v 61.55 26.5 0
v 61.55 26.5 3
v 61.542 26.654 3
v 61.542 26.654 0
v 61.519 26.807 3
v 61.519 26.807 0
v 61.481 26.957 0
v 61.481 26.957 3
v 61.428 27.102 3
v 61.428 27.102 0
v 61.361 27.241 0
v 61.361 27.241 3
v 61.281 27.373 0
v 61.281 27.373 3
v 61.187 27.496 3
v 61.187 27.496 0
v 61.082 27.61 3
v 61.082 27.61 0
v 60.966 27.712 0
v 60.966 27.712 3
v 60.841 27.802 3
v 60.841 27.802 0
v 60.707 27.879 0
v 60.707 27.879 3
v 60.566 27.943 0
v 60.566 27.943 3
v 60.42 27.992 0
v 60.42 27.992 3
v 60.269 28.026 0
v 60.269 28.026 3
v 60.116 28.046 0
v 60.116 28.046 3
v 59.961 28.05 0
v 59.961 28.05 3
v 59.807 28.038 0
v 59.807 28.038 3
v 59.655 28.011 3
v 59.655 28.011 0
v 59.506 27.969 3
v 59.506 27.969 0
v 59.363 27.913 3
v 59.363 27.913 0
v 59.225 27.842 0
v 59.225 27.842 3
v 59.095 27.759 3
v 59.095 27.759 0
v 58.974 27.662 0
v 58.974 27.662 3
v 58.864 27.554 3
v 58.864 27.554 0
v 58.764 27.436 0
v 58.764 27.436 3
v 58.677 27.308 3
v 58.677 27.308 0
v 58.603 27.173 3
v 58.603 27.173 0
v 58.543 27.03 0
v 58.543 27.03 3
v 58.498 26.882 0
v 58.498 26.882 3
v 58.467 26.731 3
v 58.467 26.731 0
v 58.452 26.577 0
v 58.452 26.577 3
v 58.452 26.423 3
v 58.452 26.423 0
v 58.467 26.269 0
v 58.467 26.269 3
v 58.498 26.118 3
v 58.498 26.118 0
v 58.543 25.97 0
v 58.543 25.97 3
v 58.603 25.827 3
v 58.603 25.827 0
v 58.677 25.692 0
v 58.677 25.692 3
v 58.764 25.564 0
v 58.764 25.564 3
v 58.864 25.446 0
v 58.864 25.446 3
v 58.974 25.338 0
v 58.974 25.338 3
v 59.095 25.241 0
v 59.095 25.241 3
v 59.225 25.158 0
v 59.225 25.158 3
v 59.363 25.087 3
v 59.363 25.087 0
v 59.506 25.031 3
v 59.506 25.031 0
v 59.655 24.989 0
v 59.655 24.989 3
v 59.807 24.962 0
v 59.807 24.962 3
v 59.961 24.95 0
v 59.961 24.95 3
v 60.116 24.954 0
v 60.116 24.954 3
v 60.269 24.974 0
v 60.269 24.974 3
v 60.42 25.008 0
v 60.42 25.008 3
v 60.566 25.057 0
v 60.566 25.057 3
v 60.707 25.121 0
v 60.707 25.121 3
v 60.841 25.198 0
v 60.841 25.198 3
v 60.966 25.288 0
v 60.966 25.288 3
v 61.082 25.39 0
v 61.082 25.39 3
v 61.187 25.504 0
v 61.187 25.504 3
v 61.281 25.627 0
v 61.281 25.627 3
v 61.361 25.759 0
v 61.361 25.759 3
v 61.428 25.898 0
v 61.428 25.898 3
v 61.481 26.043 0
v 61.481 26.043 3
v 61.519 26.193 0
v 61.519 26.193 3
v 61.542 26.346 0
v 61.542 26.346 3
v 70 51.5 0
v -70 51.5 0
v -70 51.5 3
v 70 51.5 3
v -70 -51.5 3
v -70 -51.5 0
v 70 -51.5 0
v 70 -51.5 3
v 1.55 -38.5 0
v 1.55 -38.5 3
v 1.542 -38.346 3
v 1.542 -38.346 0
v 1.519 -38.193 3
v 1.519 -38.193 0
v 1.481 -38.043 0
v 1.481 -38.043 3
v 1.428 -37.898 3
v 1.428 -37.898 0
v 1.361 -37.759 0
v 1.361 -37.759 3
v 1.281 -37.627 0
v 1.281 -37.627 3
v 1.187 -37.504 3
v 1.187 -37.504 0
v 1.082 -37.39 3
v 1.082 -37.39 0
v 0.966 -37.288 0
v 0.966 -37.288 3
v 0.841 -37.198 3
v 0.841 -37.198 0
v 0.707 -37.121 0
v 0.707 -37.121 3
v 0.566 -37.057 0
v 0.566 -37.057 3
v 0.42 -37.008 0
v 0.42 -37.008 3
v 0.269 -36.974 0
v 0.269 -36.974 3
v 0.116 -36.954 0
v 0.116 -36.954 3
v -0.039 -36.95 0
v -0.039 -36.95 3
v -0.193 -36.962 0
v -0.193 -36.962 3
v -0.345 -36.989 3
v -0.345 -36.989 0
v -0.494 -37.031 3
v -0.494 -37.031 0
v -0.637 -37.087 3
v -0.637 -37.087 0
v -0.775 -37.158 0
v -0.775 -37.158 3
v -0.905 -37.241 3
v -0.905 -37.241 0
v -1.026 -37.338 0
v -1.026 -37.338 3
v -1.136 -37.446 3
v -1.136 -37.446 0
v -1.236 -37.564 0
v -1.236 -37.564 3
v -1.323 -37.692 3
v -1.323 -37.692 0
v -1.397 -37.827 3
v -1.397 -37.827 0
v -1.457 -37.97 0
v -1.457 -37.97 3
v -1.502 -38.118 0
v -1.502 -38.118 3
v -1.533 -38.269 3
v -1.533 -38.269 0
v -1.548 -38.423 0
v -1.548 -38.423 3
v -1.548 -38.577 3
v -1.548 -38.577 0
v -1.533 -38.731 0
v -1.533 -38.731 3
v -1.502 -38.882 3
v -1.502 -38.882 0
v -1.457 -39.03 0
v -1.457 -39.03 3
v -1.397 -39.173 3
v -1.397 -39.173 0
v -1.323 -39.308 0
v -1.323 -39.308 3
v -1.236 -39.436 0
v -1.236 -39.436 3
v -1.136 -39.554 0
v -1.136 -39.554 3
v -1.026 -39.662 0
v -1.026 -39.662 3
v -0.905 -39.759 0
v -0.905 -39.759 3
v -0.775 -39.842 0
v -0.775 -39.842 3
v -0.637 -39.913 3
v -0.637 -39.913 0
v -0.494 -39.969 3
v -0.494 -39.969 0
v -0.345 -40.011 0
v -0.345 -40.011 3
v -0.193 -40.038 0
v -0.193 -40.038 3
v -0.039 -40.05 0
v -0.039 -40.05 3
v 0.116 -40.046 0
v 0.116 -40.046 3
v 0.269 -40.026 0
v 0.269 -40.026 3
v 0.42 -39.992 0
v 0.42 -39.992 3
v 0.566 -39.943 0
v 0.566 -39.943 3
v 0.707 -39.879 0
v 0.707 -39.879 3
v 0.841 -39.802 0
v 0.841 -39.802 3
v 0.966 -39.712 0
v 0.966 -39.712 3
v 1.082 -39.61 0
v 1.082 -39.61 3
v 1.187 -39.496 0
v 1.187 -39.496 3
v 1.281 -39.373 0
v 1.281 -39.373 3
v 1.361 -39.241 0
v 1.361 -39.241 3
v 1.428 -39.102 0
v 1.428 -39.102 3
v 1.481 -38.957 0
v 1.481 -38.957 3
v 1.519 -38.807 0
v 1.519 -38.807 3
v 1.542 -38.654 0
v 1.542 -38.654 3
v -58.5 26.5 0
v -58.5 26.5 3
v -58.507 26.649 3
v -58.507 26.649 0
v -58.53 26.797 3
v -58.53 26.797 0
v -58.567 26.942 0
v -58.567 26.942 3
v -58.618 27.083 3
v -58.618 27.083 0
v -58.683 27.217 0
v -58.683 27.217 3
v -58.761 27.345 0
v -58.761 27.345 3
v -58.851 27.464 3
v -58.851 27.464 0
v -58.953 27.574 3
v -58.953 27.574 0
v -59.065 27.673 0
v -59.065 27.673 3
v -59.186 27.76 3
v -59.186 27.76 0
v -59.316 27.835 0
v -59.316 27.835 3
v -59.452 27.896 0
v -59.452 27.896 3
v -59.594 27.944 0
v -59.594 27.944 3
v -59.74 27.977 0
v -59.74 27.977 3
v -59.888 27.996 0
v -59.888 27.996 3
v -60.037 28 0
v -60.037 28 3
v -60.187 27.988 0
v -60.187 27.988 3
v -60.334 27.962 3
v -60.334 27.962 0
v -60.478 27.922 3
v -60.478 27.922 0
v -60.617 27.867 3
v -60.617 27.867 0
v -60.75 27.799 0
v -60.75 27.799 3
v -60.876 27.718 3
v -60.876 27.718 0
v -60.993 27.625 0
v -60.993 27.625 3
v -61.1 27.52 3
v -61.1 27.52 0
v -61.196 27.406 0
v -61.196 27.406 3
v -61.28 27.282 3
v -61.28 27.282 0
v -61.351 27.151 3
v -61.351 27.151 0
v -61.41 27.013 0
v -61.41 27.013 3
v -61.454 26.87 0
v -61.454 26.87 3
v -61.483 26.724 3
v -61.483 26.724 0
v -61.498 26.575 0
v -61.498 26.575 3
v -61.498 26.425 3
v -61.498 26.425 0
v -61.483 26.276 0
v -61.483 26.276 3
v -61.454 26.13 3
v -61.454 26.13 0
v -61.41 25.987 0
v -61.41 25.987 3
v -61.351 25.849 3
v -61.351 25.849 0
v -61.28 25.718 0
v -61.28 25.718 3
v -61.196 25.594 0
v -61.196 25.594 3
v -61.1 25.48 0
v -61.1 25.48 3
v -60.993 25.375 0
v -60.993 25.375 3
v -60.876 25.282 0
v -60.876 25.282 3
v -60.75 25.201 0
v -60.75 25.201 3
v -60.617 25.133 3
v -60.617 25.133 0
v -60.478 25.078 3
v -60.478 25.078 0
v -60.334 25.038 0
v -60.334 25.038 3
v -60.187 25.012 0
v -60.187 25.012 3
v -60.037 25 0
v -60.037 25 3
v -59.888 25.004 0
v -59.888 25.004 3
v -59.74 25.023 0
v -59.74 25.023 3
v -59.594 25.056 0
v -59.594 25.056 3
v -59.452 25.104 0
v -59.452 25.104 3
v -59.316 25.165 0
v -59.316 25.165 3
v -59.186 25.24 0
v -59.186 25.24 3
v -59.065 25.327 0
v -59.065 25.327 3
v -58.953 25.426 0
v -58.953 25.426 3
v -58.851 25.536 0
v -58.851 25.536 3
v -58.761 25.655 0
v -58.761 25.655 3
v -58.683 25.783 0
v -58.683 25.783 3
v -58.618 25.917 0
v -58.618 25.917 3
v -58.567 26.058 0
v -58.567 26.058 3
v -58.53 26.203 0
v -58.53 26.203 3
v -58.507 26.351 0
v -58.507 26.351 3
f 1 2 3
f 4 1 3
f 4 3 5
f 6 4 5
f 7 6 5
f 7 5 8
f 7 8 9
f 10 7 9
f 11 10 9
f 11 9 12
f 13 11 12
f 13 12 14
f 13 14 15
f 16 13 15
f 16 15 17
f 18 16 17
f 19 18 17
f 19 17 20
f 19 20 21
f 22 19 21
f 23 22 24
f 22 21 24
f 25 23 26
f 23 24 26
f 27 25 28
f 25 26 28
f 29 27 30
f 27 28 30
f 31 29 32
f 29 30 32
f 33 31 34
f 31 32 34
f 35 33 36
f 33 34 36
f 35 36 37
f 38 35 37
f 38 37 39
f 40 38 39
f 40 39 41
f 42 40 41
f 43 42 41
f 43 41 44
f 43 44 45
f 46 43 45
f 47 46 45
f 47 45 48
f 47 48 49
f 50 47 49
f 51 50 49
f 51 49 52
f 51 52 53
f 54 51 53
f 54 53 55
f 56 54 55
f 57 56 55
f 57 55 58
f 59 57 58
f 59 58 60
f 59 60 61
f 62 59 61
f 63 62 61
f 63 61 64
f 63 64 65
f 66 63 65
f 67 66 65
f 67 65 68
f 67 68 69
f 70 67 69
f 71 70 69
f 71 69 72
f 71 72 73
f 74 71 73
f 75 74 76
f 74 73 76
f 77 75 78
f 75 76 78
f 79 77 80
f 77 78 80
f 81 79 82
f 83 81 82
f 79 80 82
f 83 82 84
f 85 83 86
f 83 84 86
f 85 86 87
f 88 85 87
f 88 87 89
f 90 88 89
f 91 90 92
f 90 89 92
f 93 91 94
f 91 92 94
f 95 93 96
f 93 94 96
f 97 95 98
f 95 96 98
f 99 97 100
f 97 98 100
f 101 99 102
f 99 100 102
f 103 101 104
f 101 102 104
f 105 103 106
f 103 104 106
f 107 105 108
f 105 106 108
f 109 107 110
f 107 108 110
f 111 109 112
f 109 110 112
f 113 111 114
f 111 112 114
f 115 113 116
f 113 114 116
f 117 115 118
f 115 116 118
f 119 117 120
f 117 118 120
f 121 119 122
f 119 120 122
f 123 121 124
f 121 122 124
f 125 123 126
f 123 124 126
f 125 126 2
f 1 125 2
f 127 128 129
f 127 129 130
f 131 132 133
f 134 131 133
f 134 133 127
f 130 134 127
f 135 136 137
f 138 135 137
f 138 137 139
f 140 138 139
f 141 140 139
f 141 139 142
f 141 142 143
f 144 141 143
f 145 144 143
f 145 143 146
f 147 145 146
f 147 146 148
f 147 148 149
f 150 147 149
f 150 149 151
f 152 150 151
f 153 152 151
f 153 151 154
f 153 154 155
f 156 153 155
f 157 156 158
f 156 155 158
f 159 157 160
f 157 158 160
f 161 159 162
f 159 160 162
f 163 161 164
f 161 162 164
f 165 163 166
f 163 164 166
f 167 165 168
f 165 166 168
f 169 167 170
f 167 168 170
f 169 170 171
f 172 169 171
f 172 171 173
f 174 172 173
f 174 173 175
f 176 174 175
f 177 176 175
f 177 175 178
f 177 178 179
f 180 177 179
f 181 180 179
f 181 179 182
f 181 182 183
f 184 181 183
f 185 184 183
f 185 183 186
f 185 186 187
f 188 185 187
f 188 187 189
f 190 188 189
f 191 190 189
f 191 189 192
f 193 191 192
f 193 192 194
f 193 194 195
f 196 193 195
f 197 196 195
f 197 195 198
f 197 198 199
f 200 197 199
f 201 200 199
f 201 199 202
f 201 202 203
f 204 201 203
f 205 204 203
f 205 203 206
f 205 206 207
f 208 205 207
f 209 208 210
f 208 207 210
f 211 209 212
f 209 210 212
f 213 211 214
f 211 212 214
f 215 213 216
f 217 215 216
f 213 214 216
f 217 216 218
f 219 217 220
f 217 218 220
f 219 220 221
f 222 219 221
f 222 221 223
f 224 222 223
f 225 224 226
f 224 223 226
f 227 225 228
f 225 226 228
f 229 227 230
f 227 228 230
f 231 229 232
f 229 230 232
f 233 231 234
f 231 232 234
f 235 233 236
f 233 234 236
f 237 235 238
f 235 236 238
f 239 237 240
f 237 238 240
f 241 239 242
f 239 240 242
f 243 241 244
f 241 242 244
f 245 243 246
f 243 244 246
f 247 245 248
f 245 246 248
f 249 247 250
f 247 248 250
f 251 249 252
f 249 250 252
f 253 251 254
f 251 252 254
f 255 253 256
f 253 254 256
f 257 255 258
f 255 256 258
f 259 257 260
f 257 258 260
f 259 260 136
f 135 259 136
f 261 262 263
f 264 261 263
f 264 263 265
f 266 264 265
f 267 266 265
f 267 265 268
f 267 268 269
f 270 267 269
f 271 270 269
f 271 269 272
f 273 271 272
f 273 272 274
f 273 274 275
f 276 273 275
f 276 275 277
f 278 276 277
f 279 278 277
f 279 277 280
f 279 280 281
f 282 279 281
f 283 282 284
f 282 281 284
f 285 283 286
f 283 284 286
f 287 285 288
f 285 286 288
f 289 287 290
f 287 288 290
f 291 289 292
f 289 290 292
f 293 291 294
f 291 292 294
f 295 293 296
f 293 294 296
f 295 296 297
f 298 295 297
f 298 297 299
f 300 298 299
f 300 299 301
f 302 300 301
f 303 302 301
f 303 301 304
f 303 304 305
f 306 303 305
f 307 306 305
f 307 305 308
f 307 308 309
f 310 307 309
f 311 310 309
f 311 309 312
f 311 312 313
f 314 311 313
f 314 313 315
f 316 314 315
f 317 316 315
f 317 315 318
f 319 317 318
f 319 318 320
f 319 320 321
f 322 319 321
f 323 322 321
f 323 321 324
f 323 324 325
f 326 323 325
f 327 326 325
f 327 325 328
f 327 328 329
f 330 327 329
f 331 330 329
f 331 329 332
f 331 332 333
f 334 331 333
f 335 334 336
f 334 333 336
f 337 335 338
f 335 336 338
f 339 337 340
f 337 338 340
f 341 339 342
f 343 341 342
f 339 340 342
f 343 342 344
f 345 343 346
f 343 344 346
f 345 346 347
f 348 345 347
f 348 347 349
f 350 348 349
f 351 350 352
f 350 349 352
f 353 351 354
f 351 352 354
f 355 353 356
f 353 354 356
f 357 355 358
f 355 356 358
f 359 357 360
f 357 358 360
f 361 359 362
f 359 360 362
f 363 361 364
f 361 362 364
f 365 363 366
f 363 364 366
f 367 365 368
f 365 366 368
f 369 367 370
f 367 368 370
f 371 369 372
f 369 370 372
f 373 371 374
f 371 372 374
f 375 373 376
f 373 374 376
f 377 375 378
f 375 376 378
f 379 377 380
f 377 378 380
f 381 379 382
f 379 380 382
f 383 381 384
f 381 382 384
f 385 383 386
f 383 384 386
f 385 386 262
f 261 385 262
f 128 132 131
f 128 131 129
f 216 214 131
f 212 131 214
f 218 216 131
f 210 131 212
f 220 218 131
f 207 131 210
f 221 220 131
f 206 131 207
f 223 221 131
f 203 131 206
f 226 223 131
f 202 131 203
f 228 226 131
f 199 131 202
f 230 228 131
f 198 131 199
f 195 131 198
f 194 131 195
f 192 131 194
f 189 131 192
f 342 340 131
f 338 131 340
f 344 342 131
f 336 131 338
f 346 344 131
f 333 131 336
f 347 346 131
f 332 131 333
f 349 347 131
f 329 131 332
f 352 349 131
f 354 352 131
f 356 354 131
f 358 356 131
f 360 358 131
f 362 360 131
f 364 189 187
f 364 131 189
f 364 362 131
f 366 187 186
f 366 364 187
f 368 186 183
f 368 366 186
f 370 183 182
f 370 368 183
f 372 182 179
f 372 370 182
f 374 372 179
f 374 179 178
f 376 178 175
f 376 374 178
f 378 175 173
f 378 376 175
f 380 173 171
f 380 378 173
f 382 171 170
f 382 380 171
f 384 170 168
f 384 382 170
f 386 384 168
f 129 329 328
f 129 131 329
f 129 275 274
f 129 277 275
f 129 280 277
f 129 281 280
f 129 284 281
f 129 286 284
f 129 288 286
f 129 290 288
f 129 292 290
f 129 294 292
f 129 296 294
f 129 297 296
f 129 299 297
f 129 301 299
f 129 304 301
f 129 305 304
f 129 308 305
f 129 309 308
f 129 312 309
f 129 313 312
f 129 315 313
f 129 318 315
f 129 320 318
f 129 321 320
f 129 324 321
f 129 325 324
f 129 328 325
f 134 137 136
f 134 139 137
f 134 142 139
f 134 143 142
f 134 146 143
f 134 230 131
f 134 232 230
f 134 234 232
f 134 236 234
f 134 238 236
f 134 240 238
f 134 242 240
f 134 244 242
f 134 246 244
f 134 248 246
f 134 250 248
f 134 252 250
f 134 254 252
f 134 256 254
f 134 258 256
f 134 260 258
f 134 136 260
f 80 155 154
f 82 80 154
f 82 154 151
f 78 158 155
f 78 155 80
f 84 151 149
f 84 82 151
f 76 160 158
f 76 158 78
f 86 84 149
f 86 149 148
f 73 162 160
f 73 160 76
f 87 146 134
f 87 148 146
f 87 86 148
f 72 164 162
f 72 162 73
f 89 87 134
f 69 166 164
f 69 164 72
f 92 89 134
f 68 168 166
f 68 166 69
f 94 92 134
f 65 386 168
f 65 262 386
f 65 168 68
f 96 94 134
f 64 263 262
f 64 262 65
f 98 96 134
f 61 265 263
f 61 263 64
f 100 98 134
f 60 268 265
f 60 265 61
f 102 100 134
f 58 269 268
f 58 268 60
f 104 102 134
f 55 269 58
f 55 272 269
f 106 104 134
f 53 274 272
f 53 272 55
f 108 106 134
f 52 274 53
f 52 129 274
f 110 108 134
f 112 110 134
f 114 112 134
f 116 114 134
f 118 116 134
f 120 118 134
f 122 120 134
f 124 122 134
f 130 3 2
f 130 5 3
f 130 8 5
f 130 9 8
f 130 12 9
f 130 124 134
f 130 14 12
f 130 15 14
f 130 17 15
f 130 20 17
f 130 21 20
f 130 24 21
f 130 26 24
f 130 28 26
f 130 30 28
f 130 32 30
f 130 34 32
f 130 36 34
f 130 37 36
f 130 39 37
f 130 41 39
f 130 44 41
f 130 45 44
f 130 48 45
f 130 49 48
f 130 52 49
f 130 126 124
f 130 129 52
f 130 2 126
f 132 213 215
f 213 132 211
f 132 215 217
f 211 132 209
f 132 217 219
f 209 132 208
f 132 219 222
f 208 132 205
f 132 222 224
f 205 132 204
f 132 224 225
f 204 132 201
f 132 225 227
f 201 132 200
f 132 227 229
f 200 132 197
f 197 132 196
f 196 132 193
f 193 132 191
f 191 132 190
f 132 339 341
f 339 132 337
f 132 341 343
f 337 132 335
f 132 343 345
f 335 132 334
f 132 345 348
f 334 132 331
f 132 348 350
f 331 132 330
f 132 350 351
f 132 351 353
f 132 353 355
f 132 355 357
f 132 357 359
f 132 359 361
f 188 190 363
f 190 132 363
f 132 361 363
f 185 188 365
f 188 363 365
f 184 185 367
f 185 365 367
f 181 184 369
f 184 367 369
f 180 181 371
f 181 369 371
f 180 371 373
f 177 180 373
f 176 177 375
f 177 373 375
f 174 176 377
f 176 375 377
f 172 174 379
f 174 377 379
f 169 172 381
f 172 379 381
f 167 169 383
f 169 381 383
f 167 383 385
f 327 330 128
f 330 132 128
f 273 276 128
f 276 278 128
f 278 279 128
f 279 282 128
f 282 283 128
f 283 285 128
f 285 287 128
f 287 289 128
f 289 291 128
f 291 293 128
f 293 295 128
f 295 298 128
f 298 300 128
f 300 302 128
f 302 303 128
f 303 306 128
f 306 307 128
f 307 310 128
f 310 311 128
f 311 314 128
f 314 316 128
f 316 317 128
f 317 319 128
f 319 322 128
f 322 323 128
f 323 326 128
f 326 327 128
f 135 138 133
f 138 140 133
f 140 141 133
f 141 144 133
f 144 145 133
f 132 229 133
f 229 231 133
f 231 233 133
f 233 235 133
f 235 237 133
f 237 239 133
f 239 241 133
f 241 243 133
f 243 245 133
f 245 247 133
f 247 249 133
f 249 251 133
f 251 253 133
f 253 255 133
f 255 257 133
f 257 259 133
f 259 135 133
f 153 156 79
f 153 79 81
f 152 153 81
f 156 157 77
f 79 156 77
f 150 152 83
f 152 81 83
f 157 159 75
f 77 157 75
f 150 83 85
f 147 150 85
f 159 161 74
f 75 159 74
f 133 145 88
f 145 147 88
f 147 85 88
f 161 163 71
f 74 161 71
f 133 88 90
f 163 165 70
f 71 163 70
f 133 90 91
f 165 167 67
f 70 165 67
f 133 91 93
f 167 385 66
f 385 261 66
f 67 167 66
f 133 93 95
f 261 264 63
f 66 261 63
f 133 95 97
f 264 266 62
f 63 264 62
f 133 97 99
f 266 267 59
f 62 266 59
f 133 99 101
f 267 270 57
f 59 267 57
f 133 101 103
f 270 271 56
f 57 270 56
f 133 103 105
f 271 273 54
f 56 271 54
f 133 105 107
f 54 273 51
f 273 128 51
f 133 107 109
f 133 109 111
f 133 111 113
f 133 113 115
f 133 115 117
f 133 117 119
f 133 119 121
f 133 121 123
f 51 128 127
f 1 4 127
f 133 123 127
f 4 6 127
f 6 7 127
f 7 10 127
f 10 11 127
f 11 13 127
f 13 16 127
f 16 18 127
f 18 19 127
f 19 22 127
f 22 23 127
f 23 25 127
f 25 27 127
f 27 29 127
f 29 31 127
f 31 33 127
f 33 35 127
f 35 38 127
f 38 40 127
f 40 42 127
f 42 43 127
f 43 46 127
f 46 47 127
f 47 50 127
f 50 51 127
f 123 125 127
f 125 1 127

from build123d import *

# Parameters (mm, degrees)
SKETCH_1_W          = 140
SKETCH_1_H          = 103
EXTRUDE_1_DEPTH     = 3
SKETCH_2_R          = 1.5
SKETCH_2_R_2        = 1.55
CUT_EXTRUDE_1_DEPTH = 87.955448363


with BuildPart() as part:
    # 草图1 → 凸台-拉伸1 (new body)
    with BuildSketch(Plane.XY):
        Rectangle(SKETCH_1_W, SKETCH_1_H)
    extrude(amount=EXTRUDE_1_DEPTH)

    # 草图2 → 切除-拉伸1 (cut, through all)
    with BuildSketch(Plane.XY.offset(3)):
        with Locations((-60, 26.5)):
            Circle(SKETCH_2_R)
        with Locations((60, 26.5)):
            Circle(SKETCH_2_R_2)
        with Locations((0, -38.5)):
            Circle(SKETCH_2_R_2)
    extrude(amount=-CUT_EXTRUDE_1_DEPTH, mode=Mode.SUBTRACT)


solid = part.part
